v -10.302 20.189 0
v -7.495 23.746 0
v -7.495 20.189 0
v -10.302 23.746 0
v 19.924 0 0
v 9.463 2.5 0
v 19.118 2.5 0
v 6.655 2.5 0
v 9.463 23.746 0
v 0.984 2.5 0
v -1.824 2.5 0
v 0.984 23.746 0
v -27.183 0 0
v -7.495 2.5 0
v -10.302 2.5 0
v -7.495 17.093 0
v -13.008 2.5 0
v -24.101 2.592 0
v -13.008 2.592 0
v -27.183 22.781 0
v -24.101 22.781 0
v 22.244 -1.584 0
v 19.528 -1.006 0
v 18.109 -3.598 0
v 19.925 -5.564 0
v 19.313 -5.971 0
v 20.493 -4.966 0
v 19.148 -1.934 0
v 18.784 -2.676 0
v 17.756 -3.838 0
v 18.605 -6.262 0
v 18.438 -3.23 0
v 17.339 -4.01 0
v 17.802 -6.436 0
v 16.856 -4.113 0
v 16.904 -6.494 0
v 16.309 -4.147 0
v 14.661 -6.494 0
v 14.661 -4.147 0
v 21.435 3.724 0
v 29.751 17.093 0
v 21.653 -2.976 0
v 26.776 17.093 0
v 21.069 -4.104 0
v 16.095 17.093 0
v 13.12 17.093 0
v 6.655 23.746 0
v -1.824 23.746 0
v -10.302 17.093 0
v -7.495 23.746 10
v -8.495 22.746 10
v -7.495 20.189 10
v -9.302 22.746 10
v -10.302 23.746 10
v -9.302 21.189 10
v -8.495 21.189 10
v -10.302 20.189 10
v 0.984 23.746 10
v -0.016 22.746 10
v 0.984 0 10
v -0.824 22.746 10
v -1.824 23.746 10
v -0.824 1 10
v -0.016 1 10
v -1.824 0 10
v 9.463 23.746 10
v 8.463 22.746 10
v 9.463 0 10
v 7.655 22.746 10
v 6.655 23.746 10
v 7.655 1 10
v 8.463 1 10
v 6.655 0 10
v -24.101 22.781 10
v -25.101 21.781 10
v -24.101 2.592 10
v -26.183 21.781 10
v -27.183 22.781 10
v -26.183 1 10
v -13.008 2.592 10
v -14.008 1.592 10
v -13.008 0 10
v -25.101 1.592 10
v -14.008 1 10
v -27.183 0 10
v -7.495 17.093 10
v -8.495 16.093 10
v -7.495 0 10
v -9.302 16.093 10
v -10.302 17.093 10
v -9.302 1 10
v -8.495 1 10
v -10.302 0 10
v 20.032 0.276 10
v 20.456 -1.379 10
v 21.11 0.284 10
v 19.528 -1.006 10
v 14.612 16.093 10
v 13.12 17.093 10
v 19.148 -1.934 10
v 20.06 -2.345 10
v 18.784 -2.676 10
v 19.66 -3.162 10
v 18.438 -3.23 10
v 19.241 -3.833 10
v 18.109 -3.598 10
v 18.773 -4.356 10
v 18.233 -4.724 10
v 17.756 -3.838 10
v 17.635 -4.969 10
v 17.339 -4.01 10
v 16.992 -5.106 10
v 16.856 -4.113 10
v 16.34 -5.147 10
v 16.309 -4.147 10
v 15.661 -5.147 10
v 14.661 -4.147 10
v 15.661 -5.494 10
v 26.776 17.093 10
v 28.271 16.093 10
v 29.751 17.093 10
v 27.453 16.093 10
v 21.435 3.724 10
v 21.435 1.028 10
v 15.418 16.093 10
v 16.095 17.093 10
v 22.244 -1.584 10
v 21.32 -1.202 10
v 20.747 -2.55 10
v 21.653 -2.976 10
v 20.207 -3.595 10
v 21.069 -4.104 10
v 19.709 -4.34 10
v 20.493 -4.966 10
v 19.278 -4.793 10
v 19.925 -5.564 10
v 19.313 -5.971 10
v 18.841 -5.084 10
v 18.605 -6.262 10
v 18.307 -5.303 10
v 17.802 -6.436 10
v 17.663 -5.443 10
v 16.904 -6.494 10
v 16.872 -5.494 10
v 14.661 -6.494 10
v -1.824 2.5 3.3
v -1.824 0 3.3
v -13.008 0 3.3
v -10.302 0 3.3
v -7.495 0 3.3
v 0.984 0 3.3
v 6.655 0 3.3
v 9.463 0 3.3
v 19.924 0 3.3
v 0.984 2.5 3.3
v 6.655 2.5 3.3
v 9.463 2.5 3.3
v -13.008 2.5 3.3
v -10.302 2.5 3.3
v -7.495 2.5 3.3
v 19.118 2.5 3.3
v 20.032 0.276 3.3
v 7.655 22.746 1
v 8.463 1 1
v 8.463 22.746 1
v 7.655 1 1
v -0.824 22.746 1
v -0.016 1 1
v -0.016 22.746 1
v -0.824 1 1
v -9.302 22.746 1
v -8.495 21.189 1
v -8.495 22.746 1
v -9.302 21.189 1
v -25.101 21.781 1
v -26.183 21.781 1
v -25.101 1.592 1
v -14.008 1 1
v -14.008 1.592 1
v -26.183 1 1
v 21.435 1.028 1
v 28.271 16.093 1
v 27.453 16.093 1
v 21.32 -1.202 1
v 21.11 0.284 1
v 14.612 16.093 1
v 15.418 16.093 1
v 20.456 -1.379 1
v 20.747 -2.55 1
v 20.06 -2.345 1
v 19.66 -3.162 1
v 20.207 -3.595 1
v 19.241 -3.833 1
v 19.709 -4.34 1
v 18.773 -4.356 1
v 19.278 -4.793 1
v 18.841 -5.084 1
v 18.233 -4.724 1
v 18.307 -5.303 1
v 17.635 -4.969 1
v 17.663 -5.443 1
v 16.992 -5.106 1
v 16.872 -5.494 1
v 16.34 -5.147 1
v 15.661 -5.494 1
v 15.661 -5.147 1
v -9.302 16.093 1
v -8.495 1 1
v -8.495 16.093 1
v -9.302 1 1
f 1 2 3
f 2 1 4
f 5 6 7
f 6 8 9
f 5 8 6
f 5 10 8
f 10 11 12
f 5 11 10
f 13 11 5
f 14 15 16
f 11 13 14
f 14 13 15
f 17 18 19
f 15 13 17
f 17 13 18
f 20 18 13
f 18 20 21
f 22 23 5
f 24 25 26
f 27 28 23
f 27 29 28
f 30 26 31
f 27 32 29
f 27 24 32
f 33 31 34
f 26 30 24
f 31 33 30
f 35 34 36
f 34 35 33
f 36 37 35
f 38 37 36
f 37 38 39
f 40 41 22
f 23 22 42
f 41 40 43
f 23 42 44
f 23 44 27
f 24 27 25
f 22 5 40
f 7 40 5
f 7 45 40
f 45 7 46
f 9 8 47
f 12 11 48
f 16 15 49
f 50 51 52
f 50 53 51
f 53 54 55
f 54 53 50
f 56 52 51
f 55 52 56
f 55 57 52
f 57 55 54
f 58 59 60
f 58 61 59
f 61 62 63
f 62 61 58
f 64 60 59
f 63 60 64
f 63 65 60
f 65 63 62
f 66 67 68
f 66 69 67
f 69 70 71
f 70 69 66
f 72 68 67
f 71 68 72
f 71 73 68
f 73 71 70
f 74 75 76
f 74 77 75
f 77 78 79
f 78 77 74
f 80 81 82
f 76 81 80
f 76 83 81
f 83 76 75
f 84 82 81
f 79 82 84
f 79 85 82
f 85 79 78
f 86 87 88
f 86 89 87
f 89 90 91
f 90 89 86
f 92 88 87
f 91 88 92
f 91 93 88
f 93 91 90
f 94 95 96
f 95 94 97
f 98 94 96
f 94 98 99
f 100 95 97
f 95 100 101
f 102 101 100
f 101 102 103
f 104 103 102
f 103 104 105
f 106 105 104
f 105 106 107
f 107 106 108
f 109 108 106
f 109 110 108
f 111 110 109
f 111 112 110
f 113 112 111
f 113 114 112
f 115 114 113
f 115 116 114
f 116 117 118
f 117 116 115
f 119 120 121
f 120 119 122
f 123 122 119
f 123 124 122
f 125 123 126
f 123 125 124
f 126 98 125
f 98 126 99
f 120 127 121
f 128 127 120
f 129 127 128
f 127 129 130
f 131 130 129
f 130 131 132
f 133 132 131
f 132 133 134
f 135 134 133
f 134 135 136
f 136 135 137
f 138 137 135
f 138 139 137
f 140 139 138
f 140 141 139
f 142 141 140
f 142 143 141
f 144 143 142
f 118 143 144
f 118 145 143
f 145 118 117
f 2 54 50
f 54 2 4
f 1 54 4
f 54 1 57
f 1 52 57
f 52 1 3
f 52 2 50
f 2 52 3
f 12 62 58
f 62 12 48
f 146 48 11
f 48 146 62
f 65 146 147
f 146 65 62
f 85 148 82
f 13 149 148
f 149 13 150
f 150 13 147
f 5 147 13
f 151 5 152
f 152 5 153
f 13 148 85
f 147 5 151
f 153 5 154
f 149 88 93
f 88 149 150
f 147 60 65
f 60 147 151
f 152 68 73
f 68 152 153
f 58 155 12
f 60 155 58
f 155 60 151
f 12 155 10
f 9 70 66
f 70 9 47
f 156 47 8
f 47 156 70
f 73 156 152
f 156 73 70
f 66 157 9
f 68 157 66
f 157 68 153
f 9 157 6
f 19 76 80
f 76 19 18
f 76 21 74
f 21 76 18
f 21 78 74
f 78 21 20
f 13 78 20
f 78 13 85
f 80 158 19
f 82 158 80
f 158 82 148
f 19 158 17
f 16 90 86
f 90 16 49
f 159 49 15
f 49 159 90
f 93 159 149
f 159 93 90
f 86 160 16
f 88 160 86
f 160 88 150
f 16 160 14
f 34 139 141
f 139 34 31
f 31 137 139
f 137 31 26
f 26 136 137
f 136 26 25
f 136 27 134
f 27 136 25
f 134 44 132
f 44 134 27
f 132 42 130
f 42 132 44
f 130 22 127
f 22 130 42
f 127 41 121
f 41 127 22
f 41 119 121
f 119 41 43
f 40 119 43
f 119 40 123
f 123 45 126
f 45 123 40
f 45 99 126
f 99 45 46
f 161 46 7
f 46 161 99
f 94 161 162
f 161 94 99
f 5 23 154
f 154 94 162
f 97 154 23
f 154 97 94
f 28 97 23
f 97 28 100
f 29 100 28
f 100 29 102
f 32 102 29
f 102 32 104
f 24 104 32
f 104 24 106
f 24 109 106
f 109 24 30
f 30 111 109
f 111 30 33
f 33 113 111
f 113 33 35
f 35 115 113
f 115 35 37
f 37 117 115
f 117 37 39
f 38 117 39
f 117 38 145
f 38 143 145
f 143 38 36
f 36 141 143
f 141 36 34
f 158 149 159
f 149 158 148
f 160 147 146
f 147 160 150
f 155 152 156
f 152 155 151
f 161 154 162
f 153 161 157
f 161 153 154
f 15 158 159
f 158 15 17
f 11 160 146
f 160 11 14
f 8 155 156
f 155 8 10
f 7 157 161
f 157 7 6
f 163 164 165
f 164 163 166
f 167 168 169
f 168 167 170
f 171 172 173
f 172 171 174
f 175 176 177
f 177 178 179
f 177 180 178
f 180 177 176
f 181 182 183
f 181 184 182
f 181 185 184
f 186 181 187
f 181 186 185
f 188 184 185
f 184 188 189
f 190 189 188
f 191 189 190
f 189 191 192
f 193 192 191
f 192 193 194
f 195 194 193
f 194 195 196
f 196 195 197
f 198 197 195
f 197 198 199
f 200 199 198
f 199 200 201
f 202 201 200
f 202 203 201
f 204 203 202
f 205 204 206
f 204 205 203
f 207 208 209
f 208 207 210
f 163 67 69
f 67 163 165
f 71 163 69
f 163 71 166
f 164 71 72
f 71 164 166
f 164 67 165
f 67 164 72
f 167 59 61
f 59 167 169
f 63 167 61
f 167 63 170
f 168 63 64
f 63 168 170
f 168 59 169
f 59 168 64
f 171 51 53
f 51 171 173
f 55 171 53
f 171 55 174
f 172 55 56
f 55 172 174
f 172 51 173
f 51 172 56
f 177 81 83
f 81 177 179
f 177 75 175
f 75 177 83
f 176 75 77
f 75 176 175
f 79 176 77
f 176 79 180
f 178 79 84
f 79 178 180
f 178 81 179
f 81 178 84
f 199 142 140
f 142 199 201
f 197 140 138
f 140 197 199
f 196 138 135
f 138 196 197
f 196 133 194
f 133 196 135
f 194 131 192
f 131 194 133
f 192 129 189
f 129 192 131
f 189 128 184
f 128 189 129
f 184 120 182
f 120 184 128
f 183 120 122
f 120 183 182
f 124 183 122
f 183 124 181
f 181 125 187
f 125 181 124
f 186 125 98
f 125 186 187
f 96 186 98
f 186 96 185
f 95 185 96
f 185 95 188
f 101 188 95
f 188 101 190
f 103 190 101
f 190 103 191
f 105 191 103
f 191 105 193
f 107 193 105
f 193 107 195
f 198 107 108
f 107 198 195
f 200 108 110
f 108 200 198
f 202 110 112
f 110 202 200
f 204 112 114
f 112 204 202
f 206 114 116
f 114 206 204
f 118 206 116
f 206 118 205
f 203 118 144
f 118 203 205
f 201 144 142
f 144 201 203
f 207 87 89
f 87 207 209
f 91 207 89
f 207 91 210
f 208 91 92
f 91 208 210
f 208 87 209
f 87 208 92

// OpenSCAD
//Set the text to render
textstring="Lilly";

//Font name. In the list is first a selection of bold fonts. After the dashed line you get a list of thinner fonts, which are not really recommended.
fontname="Holtwood One SC"; //[Holtwood One SC,Alegreya Sans SC Black,Alfa Slab One,Asset,Black Ops One,Bowlby One,Bowlby One SC,Chango,Cinzel Decorative Black,Coustard,Elsie Black,Elsie Swash Caps Black,Erica One,Exo2 Black,Fascinate,Lobster,PassionOne,Plaster,Poller One,Rammetto One,Ruslan Display,Sarpanch Black,Sigmar One,Sonsie One,Titan One,Ultra,Hanalei,---------,ABeeZee,Abel,Abril Fatface,Aclonica,Acme,Actor,Adamina,Advent Pro,Aguafina Script,Akronim,Aladin,Aldrich,Alef,Alex Brush,Alice,Alike,Alike Angular,Allan,Allerta,Allerta Stencil,Allura,Almendra,Almendra Display,Almendra SC,Amarante,Amaranth,Amatic SC,Amethysta,Amiri,Anaheim,Andada,Andika,Angkor,Annie Use Your Telescope,Anonymous Pro,Antic,Antic Didone,Antic Slab,Anton,Arapey,Arbutus,Arbutus Slab,Architects Daughter,Archivo Black,Archivo Narrow,Arimo,Arizonia,Armata,Artifika,Arvo,Asap,Asset,Astloch,Asul,Atomic Age,Aubrey,Audiowide,Autour One,Average,Average Sans,Averia Gruesa Libre,Averia Libre,Averia Sans Libre,Averia Serif Libre,Bad Script,Balthazar,Bangers,Basic,Battambang,Baumans,Bayon,Belgrano,Belleza,BenchNine,Bentham,Berkshire Swash,Bevan,Bigelow Rules,Bigshot One,Bilbo,Bilbo Swash Caps,Bitter,Black Ops One,Bokor,Bonbon,Boogaloo,Bowlby One,Bowlby One SC,Brawler,Bree Serif,Bubblegum Sans,Bubbler One,Buda,Buenard,Butcherman,Butterfly Kids,Cabin,Cabin Condensed,Cabin Sketch,Caesar Dressing,Cagliostro,Calligraffitti,Cambay,Cambo,Candal,Cantarell,Cantata One,Cantora One,Capriola,Cardo,Carme,Carrois Gothic,Carrois Gothic SC,Carter One,Caudex,Cedarville Cursive,Ceviche One,Changa One,Chango,Chau Philomene One,Chela One,Chelsea Market,Chenla,Cherry Cream Soda,Cherry Swash,Chewy,Chicle,Chivo,Cinzel,Cinzel Decorative,Clicker Script,Coda,Coda Caption,Codystar,Combo,Comfortaa,Coming Soon,Concert One,Condiment,Content,Contrail One,Convergence,Cookie,Copse,Corben,Courgette,Cousine,Coustard,Covered By Your Grace,Crafty Girls,Creepster,Crete Round,Crimson Text,Croissant One,Crushed,Cuprum,Cutive,Cutive Mono,Damion,Dancing Script,Dangrek,Dawning of a New Day,Days One,Dekko,Delius,Delius Swash Caps,Delius Unicase,Della Respira,Denk One,Devonshire,Dhurjati,Didact Gothic,Diplomata,Diplomata SC,Domine,Donegal One,Doppio One,Dorsa,Dosis,Dr Sugiyama,Droid Sans,Droid Sans Mono,Droid Serif,Duru Sans,Dynalight,Eagle Lake,Eater,EB Garamond,Economica,Ek Mukta,Electrolize,Elsie,Elsie Swash Caps,Emblema One,Emilys Candy,Engagement,Englebert,Enriqueta,Erica One,Esteban,Euphoria Script,Ewert,Exo,Exo 2,Expletus Sans,Fanwood Text,Fascinate,Fascinate Inline,Faster One,Fasthand,Fauna One,Federant,Federo,Felipa,Fenix,Finger Paint,Fira Mono,Fira Sans,Fjalla One,Fjord One,Flamenco,Flavors,Fondamento,Fontdiner Swanky,Forum,Francois One,Freckle Face,Fredericka the Great,Fredoka One,Freehand,Fresca,Frijole,Fruktur,Fugaz One,Gabriela,Gafata,Galdeano,Galindo,Gentium Basic,Gentium Book Basic,Geo,Geostar,Geostar Fill,Germania One,GFS Didot,GFS Neohellenic,Gidugu,Gilda Display,Give You Glory,Glass Antiqua,Glegoo,Gloria Hallelujah,Goblin One,Gochi Hand,Gorditas,Goudy Bookletter 1911,Graduate,Grand Hotel,Gravitas One,Great Vibes,Griffy,Gruppo,Gudea,Gurajada,Habibi,Halant,Hammersmith One,Hanalei,Hanalei Fill,Handlee,Hanuman,Happy Monkey,Headland One,Henny Penny,Herr Von Muellerhoff,Hind,Homemade Apple,Homenaje,Iceberg,Iceland,IM Fell Double Pica,IM Fell Double Pica SC,IM Fell DW Pica,IM Fell DW Pica SC,IM Fell English,IM Fell English SC,IM Fell French Canon,IM Fell French Canon SC,IM Fell Great Primer,IM Fell Great Primer SC,Imprima,Inconsolata,Inder,Indie Flower,Inika,Irish Grover,Istok Web,Italiana,Italianno,Jacques Francois,Jacques Francois Shadow,Jim Nightshade,Jockey One,Jolly Lodger,Josefin Sans,Josefin Slab,Joti One,Judson,Julee,Julius Sans One,Junge,Jura,Just Another Hand,Just Me Again Down Here,Kalam,Kameron,Kantumruy,Karla,Karma,Kaushan Script,Kavoon,Kdam Thmor,Keania One,Kelly Slab,Kenia,Khand,Khmer,Khula,Kite One,Knewave,Kotta One,Koulen,Kranky,Kreon,Kristi,Krona One,La Belle Aurore,Laila,Lakki Reddy,Lancelot,Lateef,Lato,League Script,Leckerli One,Ledger,Lekton,Lemon,Liberation Sans,Libre Baskerville,Life Savers,Lilita One,Lily Script One,Limelight,Linden Hill,Lobster,Lobster Two,Londrina Outline,Londrina Shadow,Londrina Sketch,Londrina Solid,Lora,Love Ya Like A Sister,Loved by the King,Lovers Quarrel,Luckiest Guy,Lusitana,Lustria,Macondo,Macondo Swash Caps,Magra,Maiden Orange,Mako,Mallanna,Mandali,Marcellus,Marcellus SC,Marck Script,Margarine,Marko One,Marmelad,Martel Sans,Marvel,Mate,Mate SC,Maven Pro,McLaren,Meddon,MedievalSharp,Medula One,Megrim,Meie Script,Merienda,Merienda One,Merriweather,Merriweather Sans,Metal,Metal Mania,Metamorphous,Metrophobic,Michroma,Milonga,Miltonian,Miltonian Tattoo,Miniver,Miss Fajardose,Modak,Modern Antiqua,Molengo,Molle,Monda,Monofett,Monoton,Monsieur La Doulaise,Montaga,Montez,Montserrat,Montserrat Alternates,Montserrat Subrayada,Moul,Moulpali,Mountains of Christmas,Mouse Memoirs,Mr Bedfort,Mr Dafoe,Mr De Haviland,Mrs Saint Delafield,Mrs Sheppards,Muli,Mystery Quest,Neucha,Neuton,New Rocker,News Cycle,Niconne,Nixie One,Nobile,Nokora,Norican,Nosifer,Nothing You Could Do,Noticia Text,Noto Sans,Noto Serif,Nova Cut,Nova Flat,Nova Mono,Nova Oval,Nova Round,Nova Script,Nova Slim,Nova Square,NTR,Numans,Nunito,Odor Mean Chey,Offside,Old Standard TT,Oldenburg,Oleo Script,Oleo Script Swash Caps,Open Sans,Open Sans Condensed,Oranienbaum,Orbitron,Oregano,Orienta,Original Surfer,Oswald,Over the Rainbow,Overlock,Overlock SC,Ovo,Oxygen,Oxygen Mono,Pacifico,Paprika,Parisienne,Passero One,Passion One,Pathway Gothic One,Patrick Hand,Patrick Hand SC,Patua One,Paytone One,Peddana,Peralta,Permanent Marker,Petit Formal Script,Petrona,Philosopher,Piedra,Pinyon Script,Pirata One,Plaster,Play,Playball,Playfair Display,Playfair Display SC,Podkova,Poiret One,Poller One,Poly,Pompiere,Pontano Sans,Port Lligat Sans,Port Lligat Slab,Prata,Preahvihear,Press Start 2P,Princess Sofia,Prociono,Prosto One,PT Mono,PT Sans,PT Sans Caption,PT Sans Narrow,PT Serif,PT Serif Caption,Puritan,Purple Purse,Quando,Quantico,Quattrocento,Quattrocento Sans,Questrial,Quicksand,Quintessential,Qwigley,Racing Sans One,Radley,Rajdhani,Raleway,Raleway Dots,Ramabhadra,Ramaraja,Rambla,Rammetto One,Ranchers,Rancho,Ranga,Rationale,Ravi Prakash,Redressed,Reenie Beanie,Revalia,Ribeye,Ribeye Marrow,Righteous,Risque,Roboto,Roboto Condensed,Roboto Slab,Rochester,Rock Salt,Rokkitt,Romanesco,Ropa Sans,Rosario,Rosarivo,Rouge Script,Rozha One,Rubik Mono One,Rubik One,Ruda,Rufina,Ruge Boogie,Ruluko,Rum Raisin,Ruslan Display,Russo One,Ruthie,Rye,Sacramento,Sail,Salsa,Sanchez,Sancreek,Sansita One,Sarina,Sarpanch,Satisfy,Scada,Scheherazade,Schoolbell,Seaweed Script,Sevillana,Seymour One,Shadows Into Light,Shadows Into Light Two,Shanti,Share,Share Tech,Share Tech Mono,Shojumaru,Short Stack,Siemreap,Sigmar One,Signika,Signika Negative,Simonetta,Sintony,Sirin Stencil,Six Caps,Skranji,Slabo 13px,Slabo 27px,Slackey,Smokum,Smythe,Sniglet,Snippet,Snowburst One,Sofadi One,Sofia,Sonsie One,Sorts Mill Goudy,Source Code Pro,Source Sans Pro,Source Serif Pro,Special Elite,Spicy Rice,Spinnaker,Spirax,Squada One,Sree Krushnadevaraya,Stalemate,Stalinist One,Stardos Stencil,Stint Ultra Condensed,Stint Ultra Expanded,Stoke,Strait,Sue Ellen Francisco,Sunshiney,Supermercado One,Suranna,Suravaram,Suwannaphum,Swanky and Moo Moo,Syncopate,Tangerine,Taprom,Tauri,Teko,Telex,Tenali Ramakrishna,Tenor Sans,Text Me One,The Girl Next Door,Tienne,Timmana,Tinos,Titan One,Titillium Web,Trade Winds,Trocchi,Trochut,Trykker,Tulpen One,Ubuntu,Ubuntu Condensed,Ubuntu Mono,Ultra,Uncial Antiqua,Underdog,Unica One,UnifrakturCook,UnifrakturMaguntia,Unkempt,Unlock,Unna,Vampiro One,Varela,Varela Round,Vast Shadow,Vesper Libre,Vibur,Vidaloka,Viga,Voces,Volkhov,Vollkorn,Voltaire,VT323,Waiting for the Sunrise,Wallpoet,Walter Turncoat,Warnes,Wellfleet,Wendy One,Wire One,Yanone Kaffeesatz,Yellowtail,Yeseva One,Yesteryear,Zeyada]

//Use a rounded base to connect all letters or use a connecting bar?
RoundedBase=0; //[0, 1]

//Shift the font up/down to connect i and j dots? Select "no" if you have no i or j in your text.
do_shift_font="automatic"; //[automatic,yes,no]

//Set font size in mm
textsize=25; 

//Text height (extrusion) in mm
textheight=10;

//wall thickness
wall=1;

//Connecting bar height (extrusion in print direction) in percent of the text height
baseheight_percent=.33;
baseheight=textheight*baseheight_percent;

//Connecting bar thickness in percent of the font size
basethickness_percent=0.1;
basethickness=textsize*basethickness_percent;

//Amount to shift the font up/down to connect i and j dots for printing. 
shift_font_percent=0.07;
shift_font=textsize*shift_font_percent;

//Only for a rounded base: Base increase size to make letters meet, in percent of the textsize
base_radius_add_percent=.1;
base_radius_add=textsize*base_radius_add_percent;

/* [Hidden] */
//-------------------------------------------------------------------------------

iorj = [ for (i = [0 : len(textstring) - 1]) if (textstring[i]=="i" || textstring[i]=="j") 1 ];

dummy_cutoutlen=len(textstring)*textsize;

/*
Text Storage
Version 3, March 2015
Written by MC Geisler (mcgenki at gmail dot com)

If you need to store Stuff in letters, this is the way to go.

Each letter and also the dots of 'i' and 'j' are connected together, so after printing it will not fall apart.

Have fun!

License: Attribution 4.0 International (CC BY 4.0)

You are free to:
    Share - copy and redistribute the material in any medium or format
    Adapt - remix, transform, and build upon the material
    for any purpose, even commercially.
*/


    
module writetext(textstr, sizeit)
{
    text(textstr,size=sizeit*.9,font=fontname,halign="center",valign="baseline");
}

module RiseText(textstr, textsize,textheight) 
{
    difference()
    {
        union()
        {
            linear_extrude(height=textheight,convexity = 32)
                writetext(textstr, textsize);

            //create base
            if(RoundedBase==0)
            {
                //base line to connect
                linear_extrude(height=baseheight, twist=0, slices=1, $fn=32, convexity = 15) 
                    hull()
                        intersection()
                        {
                            writetext(textstr, textsize);
                            
                            //translate([0,-textsize/2+basethickness/2+base_offset,0])
                            translate([0,basethickness/2,0])
                               square([dummy_cutoutlen,basethickness],center=true);
                        }
                      
                if ( (do_shift_font=="automatic" && iorj[0]==1 && fontname!="Holtwood One SC") || do_shift_font=="yes")  
                {
                    //connect i and j dots
                    intersection()
                    {
                        union()
                        {
                            translate([0,-shift_font,0])
                                linear_extrude(height=baseheight/2,convexity = 15)
                                    writetext(textstr, textsize);

                            translate([0,shift_font,0])
                                linear_extrude(height=baseheight/2,convexity = 15)
                                    writetext(textstr, textsize);
                        }
                        
                        //TODO: Fix font size and this below for text function
                         translate([0,textsize/2,baseheight/2])
                            cube([dummy_cutoutlen,textsize,baseheight],center=true);
                   }
               }

            }
            else        
            {
                        linear_extrude(height=baseheight, twist=0, slices=1, $fn=32, convexity = 15) 
                            offset(r = base_radius_add) 
                            {
                                writetext(textstr, textsize);
                            }
            }
        }
        
        translate([0,0,wall])
            linear_extrude(height=textheight+2,convexity = 32)
                offset(delta=-wall)
                    writetext(textstr, textsize);
    }
}

RiseText(textstring,textsize,textheight);
